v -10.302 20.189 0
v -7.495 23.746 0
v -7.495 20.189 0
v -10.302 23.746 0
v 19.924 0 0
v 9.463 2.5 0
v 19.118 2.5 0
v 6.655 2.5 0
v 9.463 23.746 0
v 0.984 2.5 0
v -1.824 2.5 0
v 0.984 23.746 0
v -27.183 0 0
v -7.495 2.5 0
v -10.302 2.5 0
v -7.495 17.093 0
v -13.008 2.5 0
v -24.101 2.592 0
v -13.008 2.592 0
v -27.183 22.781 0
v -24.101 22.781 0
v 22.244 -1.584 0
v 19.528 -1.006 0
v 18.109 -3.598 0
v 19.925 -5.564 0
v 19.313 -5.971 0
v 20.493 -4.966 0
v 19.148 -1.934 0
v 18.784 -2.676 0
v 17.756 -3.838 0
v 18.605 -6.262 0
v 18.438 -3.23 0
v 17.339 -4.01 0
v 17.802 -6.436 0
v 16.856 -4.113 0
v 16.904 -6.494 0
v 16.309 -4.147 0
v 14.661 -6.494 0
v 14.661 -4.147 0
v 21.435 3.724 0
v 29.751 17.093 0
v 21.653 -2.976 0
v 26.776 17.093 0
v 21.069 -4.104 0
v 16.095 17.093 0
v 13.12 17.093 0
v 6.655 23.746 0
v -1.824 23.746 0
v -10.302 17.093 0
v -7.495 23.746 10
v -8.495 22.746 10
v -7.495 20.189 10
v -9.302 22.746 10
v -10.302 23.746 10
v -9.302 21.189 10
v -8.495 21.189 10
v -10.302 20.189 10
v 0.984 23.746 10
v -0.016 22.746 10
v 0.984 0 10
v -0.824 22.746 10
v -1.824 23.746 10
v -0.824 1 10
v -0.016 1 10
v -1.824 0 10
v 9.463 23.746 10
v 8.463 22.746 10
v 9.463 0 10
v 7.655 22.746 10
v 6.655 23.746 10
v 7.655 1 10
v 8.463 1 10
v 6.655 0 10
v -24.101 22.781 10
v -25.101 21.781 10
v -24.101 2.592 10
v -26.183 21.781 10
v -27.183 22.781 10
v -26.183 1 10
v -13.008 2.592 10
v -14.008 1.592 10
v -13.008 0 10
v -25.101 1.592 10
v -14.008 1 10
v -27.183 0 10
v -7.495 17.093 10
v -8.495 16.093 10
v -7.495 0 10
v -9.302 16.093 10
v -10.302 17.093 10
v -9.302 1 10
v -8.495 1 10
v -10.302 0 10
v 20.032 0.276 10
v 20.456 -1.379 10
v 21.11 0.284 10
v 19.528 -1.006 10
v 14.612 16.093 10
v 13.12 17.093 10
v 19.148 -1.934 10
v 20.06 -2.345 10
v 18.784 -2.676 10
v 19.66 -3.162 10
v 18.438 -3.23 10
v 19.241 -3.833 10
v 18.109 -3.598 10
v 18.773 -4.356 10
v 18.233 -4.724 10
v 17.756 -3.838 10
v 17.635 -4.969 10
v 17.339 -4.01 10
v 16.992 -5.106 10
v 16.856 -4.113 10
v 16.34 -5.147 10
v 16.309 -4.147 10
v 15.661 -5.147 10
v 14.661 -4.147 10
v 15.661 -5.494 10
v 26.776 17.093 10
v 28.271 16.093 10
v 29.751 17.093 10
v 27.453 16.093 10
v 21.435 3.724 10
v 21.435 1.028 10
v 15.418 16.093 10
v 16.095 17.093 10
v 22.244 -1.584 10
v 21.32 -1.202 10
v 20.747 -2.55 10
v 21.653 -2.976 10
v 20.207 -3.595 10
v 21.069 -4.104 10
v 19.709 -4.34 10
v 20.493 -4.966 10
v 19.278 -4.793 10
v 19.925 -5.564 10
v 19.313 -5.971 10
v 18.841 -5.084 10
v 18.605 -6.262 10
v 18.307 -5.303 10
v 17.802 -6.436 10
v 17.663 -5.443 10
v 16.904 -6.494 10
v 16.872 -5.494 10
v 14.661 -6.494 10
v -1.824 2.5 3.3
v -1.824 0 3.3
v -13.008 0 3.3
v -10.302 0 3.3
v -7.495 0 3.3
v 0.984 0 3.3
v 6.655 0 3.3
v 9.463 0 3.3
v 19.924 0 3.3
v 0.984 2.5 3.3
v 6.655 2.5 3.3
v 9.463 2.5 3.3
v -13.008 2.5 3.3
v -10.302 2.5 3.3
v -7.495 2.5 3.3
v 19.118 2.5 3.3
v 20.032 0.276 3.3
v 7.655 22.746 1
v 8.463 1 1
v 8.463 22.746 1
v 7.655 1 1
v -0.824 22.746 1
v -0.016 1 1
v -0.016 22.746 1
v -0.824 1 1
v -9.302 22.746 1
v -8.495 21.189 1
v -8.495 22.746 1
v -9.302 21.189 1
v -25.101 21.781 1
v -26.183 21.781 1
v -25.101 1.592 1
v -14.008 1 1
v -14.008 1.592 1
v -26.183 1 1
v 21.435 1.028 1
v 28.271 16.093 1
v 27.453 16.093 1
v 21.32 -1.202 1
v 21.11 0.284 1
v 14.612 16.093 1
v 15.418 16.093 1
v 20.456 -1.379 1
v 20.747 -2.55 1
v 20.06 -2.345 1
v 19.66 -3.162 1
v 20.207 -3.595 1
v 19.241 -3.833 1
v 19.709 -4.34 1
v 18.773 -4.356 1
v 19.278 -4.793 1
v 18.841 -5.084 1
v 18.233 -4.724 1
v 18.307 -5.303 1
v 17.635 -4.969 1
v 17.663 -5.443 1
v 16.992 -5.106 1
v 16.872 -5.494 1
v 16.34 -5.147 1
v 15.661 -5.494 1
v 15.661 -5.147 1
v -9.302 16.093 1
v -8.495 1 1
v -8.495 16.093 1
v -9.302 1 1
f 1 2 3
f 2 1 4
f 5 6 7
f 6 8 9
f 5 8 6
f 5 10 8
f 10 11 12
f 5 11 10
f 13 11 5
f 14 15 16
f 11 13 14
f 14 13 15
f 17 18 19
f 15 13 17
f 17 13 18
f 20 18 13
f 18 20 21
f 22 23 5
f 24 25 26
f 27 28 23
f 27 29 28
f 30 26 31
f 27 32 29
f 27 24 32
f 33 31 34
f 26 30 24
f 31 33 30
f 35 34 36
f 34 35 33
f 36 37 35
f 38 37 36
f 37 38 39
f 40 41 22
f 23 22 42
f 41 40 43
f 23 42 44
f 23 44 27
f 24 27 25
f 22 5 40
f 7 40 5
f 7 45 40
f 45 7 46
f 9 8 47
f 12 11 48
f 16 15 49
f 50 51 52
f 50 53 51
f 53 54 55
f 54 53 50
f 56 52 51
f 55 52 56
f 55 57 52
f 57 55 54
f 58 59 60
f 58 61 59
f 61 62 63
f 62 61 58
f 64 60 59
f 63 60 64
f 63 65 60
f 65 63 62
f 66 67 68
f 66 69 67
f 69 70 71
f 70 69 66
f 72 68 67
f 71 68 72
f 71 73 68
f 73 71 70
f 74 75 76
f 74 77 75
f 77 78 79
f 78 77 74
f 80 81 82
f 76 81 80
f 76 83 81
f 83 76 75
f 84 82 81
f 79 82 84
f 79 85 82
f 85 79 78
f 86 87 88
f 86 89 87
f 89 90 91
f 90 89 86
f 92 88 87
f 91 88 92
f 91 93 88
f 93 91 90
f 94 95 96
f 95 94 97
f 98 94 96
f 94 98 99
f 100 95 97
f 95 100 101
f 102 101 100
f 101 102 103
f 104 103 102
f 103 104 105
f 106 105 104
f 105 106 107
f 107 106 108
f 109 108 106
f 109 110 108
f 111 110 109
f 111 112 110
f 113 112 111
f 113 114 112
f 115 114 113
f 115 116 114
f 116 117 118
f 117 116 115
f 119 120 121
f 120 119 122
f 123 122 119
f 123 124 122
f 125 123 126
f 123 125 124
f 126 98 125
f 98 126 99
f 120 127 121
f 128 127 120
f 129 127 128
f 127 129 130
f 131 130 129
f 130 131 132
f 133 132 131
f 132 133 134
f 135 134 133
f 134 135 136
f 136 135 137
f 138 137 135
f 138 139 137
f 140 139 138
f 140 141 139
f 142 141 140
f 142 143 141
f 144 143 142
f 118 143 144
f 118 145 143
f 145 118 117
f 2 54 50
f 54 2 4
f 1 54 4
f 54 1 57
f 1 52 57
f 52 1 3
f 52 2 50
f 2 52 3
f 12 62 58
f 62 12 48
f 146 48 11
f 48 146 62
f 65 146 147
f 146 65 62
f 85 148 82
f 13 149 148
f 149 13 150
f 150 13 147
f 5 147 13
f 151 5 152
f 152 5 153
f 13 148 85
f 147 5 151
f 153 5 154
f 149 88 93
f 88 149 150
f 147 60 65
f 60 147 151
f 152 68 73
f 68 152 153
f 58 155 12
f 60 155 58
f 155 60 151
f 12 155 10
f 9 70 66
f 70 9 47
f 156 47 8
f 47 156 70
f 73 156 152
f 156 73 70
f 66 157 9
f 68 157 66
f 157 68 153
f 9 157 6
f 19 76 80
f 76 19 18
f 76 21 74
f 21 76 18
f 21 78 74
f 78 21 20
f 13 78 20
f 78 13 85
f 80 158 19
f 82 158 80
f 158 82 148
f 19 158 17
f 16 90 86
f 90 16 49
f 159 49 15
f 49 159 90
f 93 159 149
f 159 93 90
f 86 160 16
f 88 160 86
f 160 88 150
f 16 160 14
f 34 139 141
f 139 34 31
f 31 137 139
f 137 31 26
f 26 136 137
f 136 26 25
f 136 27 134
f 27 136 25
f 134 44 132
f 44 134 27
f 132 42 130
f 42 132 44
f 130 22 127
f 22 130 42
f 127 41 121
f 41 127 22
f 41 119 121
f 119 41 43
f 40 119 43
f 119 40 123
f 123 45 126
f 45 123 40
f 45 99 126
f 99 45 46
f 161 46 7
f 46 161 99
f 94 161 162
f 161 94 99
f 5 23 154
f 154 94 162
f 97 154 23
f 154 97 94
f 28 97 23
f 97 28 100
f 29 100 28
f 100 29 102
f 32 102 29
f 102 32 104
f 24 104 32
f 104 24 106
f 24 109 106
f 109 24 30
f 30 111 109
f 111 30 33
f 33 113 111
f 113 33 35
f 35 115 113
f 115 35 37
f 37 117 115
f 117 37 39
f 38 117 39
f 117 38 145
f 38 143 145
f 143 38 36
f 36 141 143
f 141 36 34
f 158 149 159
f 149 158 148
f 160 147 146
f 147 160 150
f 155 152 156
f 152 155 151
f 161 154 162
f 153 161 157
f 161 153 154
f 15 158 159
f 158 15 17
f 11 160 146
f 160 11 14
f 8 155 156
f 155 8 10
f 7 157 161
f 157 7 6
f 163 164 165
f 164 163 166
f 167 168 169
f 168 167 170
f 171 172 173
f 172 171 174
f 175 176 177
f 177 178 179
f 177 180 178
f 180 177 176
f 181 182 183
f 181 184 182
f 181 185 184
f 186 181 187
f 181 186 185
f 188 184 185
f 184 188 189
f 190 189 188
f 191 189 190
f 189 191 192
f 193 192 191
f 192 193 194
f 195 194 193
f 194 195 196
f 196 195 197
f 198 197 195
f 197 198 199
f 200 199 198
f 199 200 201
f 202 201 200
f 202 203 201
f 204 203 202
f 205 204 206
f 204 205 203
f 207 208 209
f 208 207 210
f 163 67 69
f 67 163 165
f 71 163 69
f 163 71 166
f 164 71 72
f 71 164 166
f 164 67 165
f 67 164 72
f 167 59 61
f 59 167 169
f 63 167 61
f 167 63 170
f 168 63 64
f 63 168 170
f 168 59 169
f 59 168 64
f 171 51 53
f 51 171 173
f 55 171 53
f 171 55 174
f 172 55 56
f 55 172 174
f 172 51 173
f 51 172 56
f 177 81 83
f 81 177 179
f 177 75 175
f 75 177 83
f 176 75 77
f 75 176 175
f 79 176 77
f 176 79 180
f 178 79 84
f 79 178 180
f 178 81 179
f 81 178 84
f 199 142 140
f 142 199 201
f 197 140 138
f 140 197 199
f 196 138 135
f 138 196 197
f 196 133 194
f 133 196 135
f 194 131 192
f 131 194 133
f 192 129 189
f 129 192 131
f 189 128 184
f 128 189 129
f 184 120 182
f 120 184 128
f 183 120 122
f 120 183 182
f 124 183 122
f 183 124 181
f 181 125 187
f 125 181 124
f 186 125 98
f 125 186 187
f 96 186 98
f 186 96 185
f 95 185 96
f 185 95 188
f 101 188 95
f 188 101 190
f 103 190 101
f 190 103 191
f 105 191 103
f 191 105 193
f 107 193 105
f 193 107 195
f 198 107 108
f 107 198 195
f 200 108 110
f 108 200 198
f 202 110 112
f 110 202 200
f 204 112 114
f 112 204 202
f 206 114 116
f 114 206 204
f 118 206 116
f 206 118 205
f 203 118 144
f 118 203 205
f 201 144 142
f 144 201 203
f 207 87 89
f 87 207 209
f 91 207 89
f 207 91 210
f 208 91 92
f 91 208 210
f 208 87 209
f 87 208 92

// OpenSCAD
//Set the text to render
textstring="Lilly";

//Font name. In the list is first a selection of bold fonts. After the dashed line you get a list of thinner fonts, which are not really recommended.
fontname="Holtwood One SC"; //[Holtwood One SC,Alegreya Sans SC Black,Alfa Slab One,Asset,Black Ops One,Bowlby One,Bowlby One SC,Chango,Cinzel Decorative Black,Coustard,Elsie Black,Elsie Swash Caps Black,Erica One,Exo2 Black,Fascinate,Lobster,PassionOne,Plaster,Poller One,Rammetto One,Ruslan Display,Sarpanch Black,Sigmar One,Sonsie One,Titan One,Ultra,Hanalei,---------,ABeeZee,Abel,Abril Fatface,Aclonica,Acme,Actor,Adamina,Advent Pro,Aguafina Script,Akronim,Aladin,Aldrich,Alef,Alex Brush,Alice,Alike,Alike Angular,Allan,Allerta,Allerta Stencil,Allura,Almendra,Almendra Display,Almendra SC,Amarante,Amaranth,Amatic SC,Amethysta,Amiri,Anaheim,Andada,Andika,Angkor,Annie Use Your Telescope,Anonymous Pro,Antic,Antic Didone,Antic Slab,Anton,Arapey,Arbutus,Arbutus Slab,Architects Daughter,Archivo Black,Archivo Narrow,Arimo,Arizonia,Armata,Artifika,Arvo,Asap,Asset,Astloch,Asul,Atomic Age,Aubrey,Audiowide,Autour One,Average,Average Sans,Averia Gruesa Libre,Averia Libre,Averia Sans Libre,Averia Serif Libre,Bad Script,Balthazar,Bangers,Basic,Battambang,Baumans,Bayon,Belgrano,Belleza,BenchNine,Bentham,Berkshire Swash,Bevan,Bigelow Rules,Bigshot One,Bilbo,Bilbo Swash Caps,Bitter,Black Ops One,Bokor,Bonbon,Boogaloo,Bowlby One,Bowlby One SC,Brawler,Bree Serif,Bubblegum Sans,Bubbler One,Buda,Buenard,Butcherman,Butterfly Kids,Cabin,Cabin Condensed,Cabin Sketch,Caesar Dressing,Cagliostro,Calligraffitti,Cambay,Cambo,Candal,Cantarell,Cantata One,Cantora One,Capriola,Cardo,Carme,Carrois Gothic,Carrois Gothic SC,Carter One,Caudex,Cedarville Cursive,Ceviche One,Changa One,Chango,Chau Philomene One,Chela One,Chelsea Market,Chenla,Cherry Cream Soda,Cherry Swash,Chewy,Chicle,Chivo,Cinzel,Cinzel Decorative,Clicker Script,Coda,Coda Caption,Codystar,Combo,Comfortaa,Coming Soon,Concert One,Condiment,Content,Contrail One,Convergence,Cookie,Copse,Corben,Courgette,Cousine,Coustard,Covered By Your Grace,Crafty Girls,Creepster,Crete Round,Crimson Text,Croissant One,Crushed,Cuprum,Cutive,Cutive Mono,Damion,Dancing Script,Dangrek,Dawning of a New Day,Days One,Dekko,Delius,Delius Swash Caps,Delius Unicase,Della Respira,Denk One,Devonshire,Dhurjati,Didact Gothic,Diplomata,Diplomata SC,Domine,Donegal One,Doppio One,Dorsa,Dosis,Dr Sugiyama,Droid Sans,Droid Sans Mono,Droid Serif,Duru Sans,Dynalight,Eagle Lake,Eater,EB Garamond,Economica,Ek Mukta,Electrolize,Elsie,Elsie Swash Caps,Emblema One,Emilys Candy,Engagement,Englebert,Enriqueta,Erica One,Esteban,Euphoria Script,Ewert,Exo,Exo 2,Expletus Sans,Fanwood Text,Fascinate,Fascinate Inline,Faster One,Fasthand,Fauna One,Federant,Federo,Felipa,Fenix,Finger Paint,Fira Mono,Fira Sans,Fjalla One,Fjord One,Flamenco,Flavors,Fondamento,Fontdiner Swanky,Forum,Francois One,Freckle Face,Fredericka the Great,Fredoka One,Freehand,Fresca,Frijole,Fruktur,Fugaz One,Gabriela,Gafata,Galdeano,Galindo,Gentium Basic,Gentium Book Basic,Geo,Geostar,Geostar Fill,Germania One,GFS Didot,GFS Neohellenic,Gidugu,Gilda Display,Give You Glory,Glass Antiqua,Glegoo,Gloria Hallelujah,Goblin One,Gochi Hand,Gorditas,Goudy Bookletter 1911,Graduate,Grand Hotel,Gravitas One,Great Vibes,Griffy,Gruppo,Gudea,Gurajada,Habibi,Halant,Hammersmith One,Hanalei,Hanalei Fill,Handlee,Hanuman,Happy Monkey,Headland One,Henny Penny,Herr Von Muellerhoff,Hind,Homemade Apple,Homenaje,Iceberg,Iceland,IM Fell Double Pica,IM Fell Double Pica SC,IM Fell DW Pica,IM Fell DW Pica SC,IM Fell English,IM Fell English SC,IM Fell French Canon,IM Fell French Canon SC,IM Fell Great Primer,IM Fell Great Primer SC,Imprima,Inconsolata,Inder,Indie Flower,Inika,Irish Grover,Istok Web,Italiana,Italianno,Jacques Francois,Jacques Francois Shadow,Jim Nightshade,Jockey One,Jolly Lodger,Josefin Sans,Josefin Slab,Joti One,Judson,Julee,Julius Sans One,Junge,Jura,Just Another Hand,Just Me Again Down Here,Kalam,Kameron,Kantumruy,Karla,Karma,Kaushan Script,Kavoon,Kdam Thmor,Keania One,Kelly Slab,Kenia,Khand,Khmer,Khula,Kite One,Knewave,Kotta One,Koulen,Kranky,Kreon,Kristi,Krona One,La Belle Aurore,Laila,Lakki Reddy,Lancelot,Lateef,Lato,League Script,Leckerli One,Ledger,Lekton,Lemon,Liberation Sans,Libre Baskerville,Life Savers,Lilita One,Lily Script One,Limelight,Linden Hill,Lobster,Lobster Two,Londrina Outline,Londrina Shadow,Londrina Sketch,Londrina Solid,Lora,Love Ya Like A Sister,Loved by the King,Lovers Quarrel,Luckiest Guy,Lusitana,Lustria,Macondo,Macondo Swash Caps,Magra,Maiden Orange,Mako,Mallanna,Mandali,Marcellus,Marcellus SC,Marck Script,Margarine,Marko One,Marmelad,Martel Sans,Marvel,Mate,Mate SC,Maven Pro,McLaren,Meddon,MedievalSharp,Medula One,Megrim,Meie Script,Merienda,Merienda One,Merriweather,Merriweather Sans,Metal,Metal Mania,Metamorphous,Metrophobic,Michroma,Milonga,Miltonian,Miltonian Tattoo,Miniver,Miss Fajardose,Modak,Modern Antiqua,Molengo,Molle,Monda,Monofett,Monoton,Monsieur La Doulaise,Montaga,Montez,Montserrat,Montserrat Alternates,Montserrat Subrayada,Moul,Moulpali,Mountains of Christmas,Mouse Memoirs,Mr Bedfort,Mr Dafoe,Mr De Haviland,Mrs Saint Delafield,Mrs Sheppards,Muli,Mystery Quest,Neucha,Neuton,New Rocker,News Cycle,Niconne,Nixie One,Nobile,Nokora,Norican,Nosifer,Nothing You Could Do,Noticia Text,Noto Sans,Noto Serif,Nova Cut,Nova Flat,Nova Mono,Nova Oval,Nova Round,Nova Script,Nova Slim,Nova Square,NTR,Numans,Nunito,Odor Mean Chey,Offside,Old Standard TT,Oldenburg,Oleo Script,Oleo Script Swash Caps,Open Sans,Open Sans Condensed,Oranienbaum,Orbitron,Oregano,Orienta,Original Surfer,Oswald,Over the Rainbow,Overlock,Overlock SC,Ovo,Oxygen,Oxygen Mono,Pacifico,Paprika,Parisienne,Passero One,Passion One,Pathway Gothic One,Patrick Hand,Patrick Hand SC,Patua One,Paytone One,Peddana,Peralta,Permanent Marker,Petit Formal Script,Petrona,Philosopher,Piedra,Pinyon Script,Pirata One,Plaster,Play,Playball,Playfair Display,Playfair Display SC,Podkova,Poiret One,Poller One,Poly,Pompiere,Pontano Sans,Port Lligat Sans,Port Lligat Slab,Prata,Preahvihear,Press Start 2P,Princess Sofia,Prociono,Prosto One,PT Mono,PT Sans,PT Sans Caption,PT Sans Narrow,PT Serif,PT Serif Caption,Puritan,Purple Purse,Quando,Quantico,Quattrocento,Quattrocento Sans,Questrial,Quicksand,Quintessential,Qwigley,Racing Sans One,Radley,Rajdhani,Raleway,Raleway Dots,Ramabhadra,Ramaraja,Rambla,Rammetto One,Ranchers,Rancho,Ranga,Rationale,Ravi Prakash,Redressed,Reenie Beanie,Revalia,Ribeye,Ribeye Marrow,Righteous,Risque,Roboto,Roboto Condensed,Roboto Slab,Rochester,Rock Salt,Rokkitt,Romanesco,Ropa Sans,Rosario,Rosarivo,Rouge Script,Rozha One,Rubik Mono One,Rubik One,Ruda,Rufina,Ruge Boogie,Ruluko,Rum Raisin,Ruslan Display,Russo One,Ruthie,Rye,Sacramento,Sail,Salsa,Sanchez,Sancreek,Sansita One,Sarina,Sarpanch,Satisfy,Scada,Scheherazade,Schoolbell,Seaweed Script,Sevillana,Seymour One,Shadows Into Light,Shadows Into Light Two,Shanti,Share,Share Tech,Share Tech Mono,Shojumaru,Short Stack,Siemreap,Sigmar One,Signika,Signika Negative,Simonetta,Sintony,Sirin Stencil,Six Caps,Skranji,Slabo 13px,Slabo 27px,Slackey,Smokum,Smythe,Sniglet,Snippet,Snowburst One,Sofadi One,Sofia,Sonsie One,Sorts Mill Goudy,Source Code Pro,Source Sans Pro,Source Serif Pro,Special Elite,Spicy Rice,Spinnaker,Spirax,Squada One,Sree Krushnadevaraya,Stalemate,Stalinist One,Stardos Stencil,Stint Ultra Condensed,Stint Ultra Expanded,Stoke,Strait,Sue Ellen Francisco,Sunshiney,Supermercado One,Suranna,Suravaram,Suwannaphum,Swanky and Moo Moo,Syncopate,Tangerine,Taprom,Tauri,Teko,Telex,Tenali Ramakrishna,Tenor Sans,Text Me One,The Girl Next Door,Tienne,Timmana,Tinos,Titan One,Titillium Web,Trade Winds,Trocchi,Trochut,Trykker,Tulpen One,Ubuntu,Ubuntu Condensed,Ubuntu Mono,Ultra,Uncial Antiqua,Underdog,Unica One,UnifrakturCook,UnifrakturMaguntia,Unkempt,Unlock,Unna,Vampiro One,Varela,Varela Round,Vast Shadow,Vesper Libre,Vibur,Vidaloka,Viga,Voces,Volkhov,Vollkorn,Voltaire,VT323,Waiting for the Sunrise,Wallpoet,Walter Turncoat,Warnes,Wellfleet,Wendy One,Wire One,Yanone Kaffeesatz,Yellowtail,Yeseva One,Yesteryear,Zeyada]

//Use a rounded base to connect all letters or use a connecting bar?
RoundedBase=0; //[0, 1]

//Shift the font up/down to connect i and j dots? Select "no" if you have no i or j in your text.
do_shift_font="automatic"; //[automatic,yes,no]

//Set font size in mm
textsize=25; 

//Text height (extrusion) in mm
textheight=10;

//wall thickness
wall=1;

//Connecting bar height (extrusion in print direction) in percent of the text height
baseheight_percent=.33;
baseheight=textheight*baseheight_percent;

//Connecting bar thickness in percent of the font size
basethickness_percent=0.1;
basethickness=textsize*basethickness_percent;

//Amount to shift the font up/down to connect i and j dots for printing. 
shift_font_percent=0.07;
shift_font=textsize*shift_font_percent;

//Only for a rounded base: Base increase size to make letters meet, in percent of the textsize
base_radius_add_percent=.1;
base_radius_add=textsize*base_radius_add_percent;

/* [Hidden] */
//-------------------------------------------------------------------------------

iorj = [ for (i = [0 : len(textstring) - 1]) if (textstring[i]=="i" || textstring[i]=="j") 1 ];

dummy_cutoutlen=len(textstring)*textsize;

/*
Text Storage
Version 3, March 2015
Written by MC Geisler (mcgenki at gmail dot com)

If you need to store Stuff in letters, this is the way to go.

Each letter and also the dots of 'i' and 'j' are connected together, so after printing it will not fall apart.

Have fun!

License: Attribution 4.0 International (CC BY 4.0)

You are free to:
    Share - copy and redistribute the material in any medium or format
    Adapt - remix, transform, and build upon the material
    for any purpose, even commercially.
*/


    
module writetext(textstr, sizeit)
{
    text(textstr,size=sizeit*.9,font=fontname,halign="center",valign="baseline");
}

module RiseText(textstr, textsize,textheight) 
{
    difference()
    {
        union()
        {
            linear_extrude(height=textheight,convexity = 32)
                writetext(textstr, textsize);

            //create base
            if(RoundedBase==0)
            {
                //base line to connect
                linear_extrude(height=baseheight, twist=0, slices=1, $fn=32, convexity = 15) 
                    hull()
                        intersection()
                        {
                            writetext(textstr, textsize);
                            
                            //translate([0,-textsize/2+basethickness/2+base_offset,0])
                            translate([0,basethickness/2,0])
                               square([dummy_cutoutlen,basethickness],center=true);
                        }
                      
                if ( (do_shift_font=="automatic" && iorj[0]==1 && fontname!="Holtwood One SC") || do_shift_font=="yes")  
                {
                    //connect i and j dots
                    intersection()
                    {
                        union()
                        {
                            translate([0,-shift_font,0])
                                linear_extrude(height=baseheight/2,convexity = 15)
                                    writetext(textstr, textsize);

                            translate([0,shift_font,0])
                                linear_extrude(height=baseheight/2,convexity = 15)
                                    writetext(textstr, textsize);
                        }
                        
                        //TODO: Fix font size and this below for text function
                         translate([0,textsize/2,baseheight/2])
                            cube([dummy_cutoutlen,textsize,baseheight],center=true);
                   }
               }

            }
            else        
            {
                        linear_extrude(height=baseheight, twist=0, slices=1, $fn=32, convexity = 15) 
                            offset(r = base_radius_add) 
                            {
                                writetext(textstr, textsize);
                            }
            }
        }
        
        translate([0,0,wall])
            linear_extrude(height=textheight+2,convexity = 32)
                offset(delta=-wall)
                    writetext(textstr, textsize);
    }
}

RiseText(textstring,textsize,textheight);
